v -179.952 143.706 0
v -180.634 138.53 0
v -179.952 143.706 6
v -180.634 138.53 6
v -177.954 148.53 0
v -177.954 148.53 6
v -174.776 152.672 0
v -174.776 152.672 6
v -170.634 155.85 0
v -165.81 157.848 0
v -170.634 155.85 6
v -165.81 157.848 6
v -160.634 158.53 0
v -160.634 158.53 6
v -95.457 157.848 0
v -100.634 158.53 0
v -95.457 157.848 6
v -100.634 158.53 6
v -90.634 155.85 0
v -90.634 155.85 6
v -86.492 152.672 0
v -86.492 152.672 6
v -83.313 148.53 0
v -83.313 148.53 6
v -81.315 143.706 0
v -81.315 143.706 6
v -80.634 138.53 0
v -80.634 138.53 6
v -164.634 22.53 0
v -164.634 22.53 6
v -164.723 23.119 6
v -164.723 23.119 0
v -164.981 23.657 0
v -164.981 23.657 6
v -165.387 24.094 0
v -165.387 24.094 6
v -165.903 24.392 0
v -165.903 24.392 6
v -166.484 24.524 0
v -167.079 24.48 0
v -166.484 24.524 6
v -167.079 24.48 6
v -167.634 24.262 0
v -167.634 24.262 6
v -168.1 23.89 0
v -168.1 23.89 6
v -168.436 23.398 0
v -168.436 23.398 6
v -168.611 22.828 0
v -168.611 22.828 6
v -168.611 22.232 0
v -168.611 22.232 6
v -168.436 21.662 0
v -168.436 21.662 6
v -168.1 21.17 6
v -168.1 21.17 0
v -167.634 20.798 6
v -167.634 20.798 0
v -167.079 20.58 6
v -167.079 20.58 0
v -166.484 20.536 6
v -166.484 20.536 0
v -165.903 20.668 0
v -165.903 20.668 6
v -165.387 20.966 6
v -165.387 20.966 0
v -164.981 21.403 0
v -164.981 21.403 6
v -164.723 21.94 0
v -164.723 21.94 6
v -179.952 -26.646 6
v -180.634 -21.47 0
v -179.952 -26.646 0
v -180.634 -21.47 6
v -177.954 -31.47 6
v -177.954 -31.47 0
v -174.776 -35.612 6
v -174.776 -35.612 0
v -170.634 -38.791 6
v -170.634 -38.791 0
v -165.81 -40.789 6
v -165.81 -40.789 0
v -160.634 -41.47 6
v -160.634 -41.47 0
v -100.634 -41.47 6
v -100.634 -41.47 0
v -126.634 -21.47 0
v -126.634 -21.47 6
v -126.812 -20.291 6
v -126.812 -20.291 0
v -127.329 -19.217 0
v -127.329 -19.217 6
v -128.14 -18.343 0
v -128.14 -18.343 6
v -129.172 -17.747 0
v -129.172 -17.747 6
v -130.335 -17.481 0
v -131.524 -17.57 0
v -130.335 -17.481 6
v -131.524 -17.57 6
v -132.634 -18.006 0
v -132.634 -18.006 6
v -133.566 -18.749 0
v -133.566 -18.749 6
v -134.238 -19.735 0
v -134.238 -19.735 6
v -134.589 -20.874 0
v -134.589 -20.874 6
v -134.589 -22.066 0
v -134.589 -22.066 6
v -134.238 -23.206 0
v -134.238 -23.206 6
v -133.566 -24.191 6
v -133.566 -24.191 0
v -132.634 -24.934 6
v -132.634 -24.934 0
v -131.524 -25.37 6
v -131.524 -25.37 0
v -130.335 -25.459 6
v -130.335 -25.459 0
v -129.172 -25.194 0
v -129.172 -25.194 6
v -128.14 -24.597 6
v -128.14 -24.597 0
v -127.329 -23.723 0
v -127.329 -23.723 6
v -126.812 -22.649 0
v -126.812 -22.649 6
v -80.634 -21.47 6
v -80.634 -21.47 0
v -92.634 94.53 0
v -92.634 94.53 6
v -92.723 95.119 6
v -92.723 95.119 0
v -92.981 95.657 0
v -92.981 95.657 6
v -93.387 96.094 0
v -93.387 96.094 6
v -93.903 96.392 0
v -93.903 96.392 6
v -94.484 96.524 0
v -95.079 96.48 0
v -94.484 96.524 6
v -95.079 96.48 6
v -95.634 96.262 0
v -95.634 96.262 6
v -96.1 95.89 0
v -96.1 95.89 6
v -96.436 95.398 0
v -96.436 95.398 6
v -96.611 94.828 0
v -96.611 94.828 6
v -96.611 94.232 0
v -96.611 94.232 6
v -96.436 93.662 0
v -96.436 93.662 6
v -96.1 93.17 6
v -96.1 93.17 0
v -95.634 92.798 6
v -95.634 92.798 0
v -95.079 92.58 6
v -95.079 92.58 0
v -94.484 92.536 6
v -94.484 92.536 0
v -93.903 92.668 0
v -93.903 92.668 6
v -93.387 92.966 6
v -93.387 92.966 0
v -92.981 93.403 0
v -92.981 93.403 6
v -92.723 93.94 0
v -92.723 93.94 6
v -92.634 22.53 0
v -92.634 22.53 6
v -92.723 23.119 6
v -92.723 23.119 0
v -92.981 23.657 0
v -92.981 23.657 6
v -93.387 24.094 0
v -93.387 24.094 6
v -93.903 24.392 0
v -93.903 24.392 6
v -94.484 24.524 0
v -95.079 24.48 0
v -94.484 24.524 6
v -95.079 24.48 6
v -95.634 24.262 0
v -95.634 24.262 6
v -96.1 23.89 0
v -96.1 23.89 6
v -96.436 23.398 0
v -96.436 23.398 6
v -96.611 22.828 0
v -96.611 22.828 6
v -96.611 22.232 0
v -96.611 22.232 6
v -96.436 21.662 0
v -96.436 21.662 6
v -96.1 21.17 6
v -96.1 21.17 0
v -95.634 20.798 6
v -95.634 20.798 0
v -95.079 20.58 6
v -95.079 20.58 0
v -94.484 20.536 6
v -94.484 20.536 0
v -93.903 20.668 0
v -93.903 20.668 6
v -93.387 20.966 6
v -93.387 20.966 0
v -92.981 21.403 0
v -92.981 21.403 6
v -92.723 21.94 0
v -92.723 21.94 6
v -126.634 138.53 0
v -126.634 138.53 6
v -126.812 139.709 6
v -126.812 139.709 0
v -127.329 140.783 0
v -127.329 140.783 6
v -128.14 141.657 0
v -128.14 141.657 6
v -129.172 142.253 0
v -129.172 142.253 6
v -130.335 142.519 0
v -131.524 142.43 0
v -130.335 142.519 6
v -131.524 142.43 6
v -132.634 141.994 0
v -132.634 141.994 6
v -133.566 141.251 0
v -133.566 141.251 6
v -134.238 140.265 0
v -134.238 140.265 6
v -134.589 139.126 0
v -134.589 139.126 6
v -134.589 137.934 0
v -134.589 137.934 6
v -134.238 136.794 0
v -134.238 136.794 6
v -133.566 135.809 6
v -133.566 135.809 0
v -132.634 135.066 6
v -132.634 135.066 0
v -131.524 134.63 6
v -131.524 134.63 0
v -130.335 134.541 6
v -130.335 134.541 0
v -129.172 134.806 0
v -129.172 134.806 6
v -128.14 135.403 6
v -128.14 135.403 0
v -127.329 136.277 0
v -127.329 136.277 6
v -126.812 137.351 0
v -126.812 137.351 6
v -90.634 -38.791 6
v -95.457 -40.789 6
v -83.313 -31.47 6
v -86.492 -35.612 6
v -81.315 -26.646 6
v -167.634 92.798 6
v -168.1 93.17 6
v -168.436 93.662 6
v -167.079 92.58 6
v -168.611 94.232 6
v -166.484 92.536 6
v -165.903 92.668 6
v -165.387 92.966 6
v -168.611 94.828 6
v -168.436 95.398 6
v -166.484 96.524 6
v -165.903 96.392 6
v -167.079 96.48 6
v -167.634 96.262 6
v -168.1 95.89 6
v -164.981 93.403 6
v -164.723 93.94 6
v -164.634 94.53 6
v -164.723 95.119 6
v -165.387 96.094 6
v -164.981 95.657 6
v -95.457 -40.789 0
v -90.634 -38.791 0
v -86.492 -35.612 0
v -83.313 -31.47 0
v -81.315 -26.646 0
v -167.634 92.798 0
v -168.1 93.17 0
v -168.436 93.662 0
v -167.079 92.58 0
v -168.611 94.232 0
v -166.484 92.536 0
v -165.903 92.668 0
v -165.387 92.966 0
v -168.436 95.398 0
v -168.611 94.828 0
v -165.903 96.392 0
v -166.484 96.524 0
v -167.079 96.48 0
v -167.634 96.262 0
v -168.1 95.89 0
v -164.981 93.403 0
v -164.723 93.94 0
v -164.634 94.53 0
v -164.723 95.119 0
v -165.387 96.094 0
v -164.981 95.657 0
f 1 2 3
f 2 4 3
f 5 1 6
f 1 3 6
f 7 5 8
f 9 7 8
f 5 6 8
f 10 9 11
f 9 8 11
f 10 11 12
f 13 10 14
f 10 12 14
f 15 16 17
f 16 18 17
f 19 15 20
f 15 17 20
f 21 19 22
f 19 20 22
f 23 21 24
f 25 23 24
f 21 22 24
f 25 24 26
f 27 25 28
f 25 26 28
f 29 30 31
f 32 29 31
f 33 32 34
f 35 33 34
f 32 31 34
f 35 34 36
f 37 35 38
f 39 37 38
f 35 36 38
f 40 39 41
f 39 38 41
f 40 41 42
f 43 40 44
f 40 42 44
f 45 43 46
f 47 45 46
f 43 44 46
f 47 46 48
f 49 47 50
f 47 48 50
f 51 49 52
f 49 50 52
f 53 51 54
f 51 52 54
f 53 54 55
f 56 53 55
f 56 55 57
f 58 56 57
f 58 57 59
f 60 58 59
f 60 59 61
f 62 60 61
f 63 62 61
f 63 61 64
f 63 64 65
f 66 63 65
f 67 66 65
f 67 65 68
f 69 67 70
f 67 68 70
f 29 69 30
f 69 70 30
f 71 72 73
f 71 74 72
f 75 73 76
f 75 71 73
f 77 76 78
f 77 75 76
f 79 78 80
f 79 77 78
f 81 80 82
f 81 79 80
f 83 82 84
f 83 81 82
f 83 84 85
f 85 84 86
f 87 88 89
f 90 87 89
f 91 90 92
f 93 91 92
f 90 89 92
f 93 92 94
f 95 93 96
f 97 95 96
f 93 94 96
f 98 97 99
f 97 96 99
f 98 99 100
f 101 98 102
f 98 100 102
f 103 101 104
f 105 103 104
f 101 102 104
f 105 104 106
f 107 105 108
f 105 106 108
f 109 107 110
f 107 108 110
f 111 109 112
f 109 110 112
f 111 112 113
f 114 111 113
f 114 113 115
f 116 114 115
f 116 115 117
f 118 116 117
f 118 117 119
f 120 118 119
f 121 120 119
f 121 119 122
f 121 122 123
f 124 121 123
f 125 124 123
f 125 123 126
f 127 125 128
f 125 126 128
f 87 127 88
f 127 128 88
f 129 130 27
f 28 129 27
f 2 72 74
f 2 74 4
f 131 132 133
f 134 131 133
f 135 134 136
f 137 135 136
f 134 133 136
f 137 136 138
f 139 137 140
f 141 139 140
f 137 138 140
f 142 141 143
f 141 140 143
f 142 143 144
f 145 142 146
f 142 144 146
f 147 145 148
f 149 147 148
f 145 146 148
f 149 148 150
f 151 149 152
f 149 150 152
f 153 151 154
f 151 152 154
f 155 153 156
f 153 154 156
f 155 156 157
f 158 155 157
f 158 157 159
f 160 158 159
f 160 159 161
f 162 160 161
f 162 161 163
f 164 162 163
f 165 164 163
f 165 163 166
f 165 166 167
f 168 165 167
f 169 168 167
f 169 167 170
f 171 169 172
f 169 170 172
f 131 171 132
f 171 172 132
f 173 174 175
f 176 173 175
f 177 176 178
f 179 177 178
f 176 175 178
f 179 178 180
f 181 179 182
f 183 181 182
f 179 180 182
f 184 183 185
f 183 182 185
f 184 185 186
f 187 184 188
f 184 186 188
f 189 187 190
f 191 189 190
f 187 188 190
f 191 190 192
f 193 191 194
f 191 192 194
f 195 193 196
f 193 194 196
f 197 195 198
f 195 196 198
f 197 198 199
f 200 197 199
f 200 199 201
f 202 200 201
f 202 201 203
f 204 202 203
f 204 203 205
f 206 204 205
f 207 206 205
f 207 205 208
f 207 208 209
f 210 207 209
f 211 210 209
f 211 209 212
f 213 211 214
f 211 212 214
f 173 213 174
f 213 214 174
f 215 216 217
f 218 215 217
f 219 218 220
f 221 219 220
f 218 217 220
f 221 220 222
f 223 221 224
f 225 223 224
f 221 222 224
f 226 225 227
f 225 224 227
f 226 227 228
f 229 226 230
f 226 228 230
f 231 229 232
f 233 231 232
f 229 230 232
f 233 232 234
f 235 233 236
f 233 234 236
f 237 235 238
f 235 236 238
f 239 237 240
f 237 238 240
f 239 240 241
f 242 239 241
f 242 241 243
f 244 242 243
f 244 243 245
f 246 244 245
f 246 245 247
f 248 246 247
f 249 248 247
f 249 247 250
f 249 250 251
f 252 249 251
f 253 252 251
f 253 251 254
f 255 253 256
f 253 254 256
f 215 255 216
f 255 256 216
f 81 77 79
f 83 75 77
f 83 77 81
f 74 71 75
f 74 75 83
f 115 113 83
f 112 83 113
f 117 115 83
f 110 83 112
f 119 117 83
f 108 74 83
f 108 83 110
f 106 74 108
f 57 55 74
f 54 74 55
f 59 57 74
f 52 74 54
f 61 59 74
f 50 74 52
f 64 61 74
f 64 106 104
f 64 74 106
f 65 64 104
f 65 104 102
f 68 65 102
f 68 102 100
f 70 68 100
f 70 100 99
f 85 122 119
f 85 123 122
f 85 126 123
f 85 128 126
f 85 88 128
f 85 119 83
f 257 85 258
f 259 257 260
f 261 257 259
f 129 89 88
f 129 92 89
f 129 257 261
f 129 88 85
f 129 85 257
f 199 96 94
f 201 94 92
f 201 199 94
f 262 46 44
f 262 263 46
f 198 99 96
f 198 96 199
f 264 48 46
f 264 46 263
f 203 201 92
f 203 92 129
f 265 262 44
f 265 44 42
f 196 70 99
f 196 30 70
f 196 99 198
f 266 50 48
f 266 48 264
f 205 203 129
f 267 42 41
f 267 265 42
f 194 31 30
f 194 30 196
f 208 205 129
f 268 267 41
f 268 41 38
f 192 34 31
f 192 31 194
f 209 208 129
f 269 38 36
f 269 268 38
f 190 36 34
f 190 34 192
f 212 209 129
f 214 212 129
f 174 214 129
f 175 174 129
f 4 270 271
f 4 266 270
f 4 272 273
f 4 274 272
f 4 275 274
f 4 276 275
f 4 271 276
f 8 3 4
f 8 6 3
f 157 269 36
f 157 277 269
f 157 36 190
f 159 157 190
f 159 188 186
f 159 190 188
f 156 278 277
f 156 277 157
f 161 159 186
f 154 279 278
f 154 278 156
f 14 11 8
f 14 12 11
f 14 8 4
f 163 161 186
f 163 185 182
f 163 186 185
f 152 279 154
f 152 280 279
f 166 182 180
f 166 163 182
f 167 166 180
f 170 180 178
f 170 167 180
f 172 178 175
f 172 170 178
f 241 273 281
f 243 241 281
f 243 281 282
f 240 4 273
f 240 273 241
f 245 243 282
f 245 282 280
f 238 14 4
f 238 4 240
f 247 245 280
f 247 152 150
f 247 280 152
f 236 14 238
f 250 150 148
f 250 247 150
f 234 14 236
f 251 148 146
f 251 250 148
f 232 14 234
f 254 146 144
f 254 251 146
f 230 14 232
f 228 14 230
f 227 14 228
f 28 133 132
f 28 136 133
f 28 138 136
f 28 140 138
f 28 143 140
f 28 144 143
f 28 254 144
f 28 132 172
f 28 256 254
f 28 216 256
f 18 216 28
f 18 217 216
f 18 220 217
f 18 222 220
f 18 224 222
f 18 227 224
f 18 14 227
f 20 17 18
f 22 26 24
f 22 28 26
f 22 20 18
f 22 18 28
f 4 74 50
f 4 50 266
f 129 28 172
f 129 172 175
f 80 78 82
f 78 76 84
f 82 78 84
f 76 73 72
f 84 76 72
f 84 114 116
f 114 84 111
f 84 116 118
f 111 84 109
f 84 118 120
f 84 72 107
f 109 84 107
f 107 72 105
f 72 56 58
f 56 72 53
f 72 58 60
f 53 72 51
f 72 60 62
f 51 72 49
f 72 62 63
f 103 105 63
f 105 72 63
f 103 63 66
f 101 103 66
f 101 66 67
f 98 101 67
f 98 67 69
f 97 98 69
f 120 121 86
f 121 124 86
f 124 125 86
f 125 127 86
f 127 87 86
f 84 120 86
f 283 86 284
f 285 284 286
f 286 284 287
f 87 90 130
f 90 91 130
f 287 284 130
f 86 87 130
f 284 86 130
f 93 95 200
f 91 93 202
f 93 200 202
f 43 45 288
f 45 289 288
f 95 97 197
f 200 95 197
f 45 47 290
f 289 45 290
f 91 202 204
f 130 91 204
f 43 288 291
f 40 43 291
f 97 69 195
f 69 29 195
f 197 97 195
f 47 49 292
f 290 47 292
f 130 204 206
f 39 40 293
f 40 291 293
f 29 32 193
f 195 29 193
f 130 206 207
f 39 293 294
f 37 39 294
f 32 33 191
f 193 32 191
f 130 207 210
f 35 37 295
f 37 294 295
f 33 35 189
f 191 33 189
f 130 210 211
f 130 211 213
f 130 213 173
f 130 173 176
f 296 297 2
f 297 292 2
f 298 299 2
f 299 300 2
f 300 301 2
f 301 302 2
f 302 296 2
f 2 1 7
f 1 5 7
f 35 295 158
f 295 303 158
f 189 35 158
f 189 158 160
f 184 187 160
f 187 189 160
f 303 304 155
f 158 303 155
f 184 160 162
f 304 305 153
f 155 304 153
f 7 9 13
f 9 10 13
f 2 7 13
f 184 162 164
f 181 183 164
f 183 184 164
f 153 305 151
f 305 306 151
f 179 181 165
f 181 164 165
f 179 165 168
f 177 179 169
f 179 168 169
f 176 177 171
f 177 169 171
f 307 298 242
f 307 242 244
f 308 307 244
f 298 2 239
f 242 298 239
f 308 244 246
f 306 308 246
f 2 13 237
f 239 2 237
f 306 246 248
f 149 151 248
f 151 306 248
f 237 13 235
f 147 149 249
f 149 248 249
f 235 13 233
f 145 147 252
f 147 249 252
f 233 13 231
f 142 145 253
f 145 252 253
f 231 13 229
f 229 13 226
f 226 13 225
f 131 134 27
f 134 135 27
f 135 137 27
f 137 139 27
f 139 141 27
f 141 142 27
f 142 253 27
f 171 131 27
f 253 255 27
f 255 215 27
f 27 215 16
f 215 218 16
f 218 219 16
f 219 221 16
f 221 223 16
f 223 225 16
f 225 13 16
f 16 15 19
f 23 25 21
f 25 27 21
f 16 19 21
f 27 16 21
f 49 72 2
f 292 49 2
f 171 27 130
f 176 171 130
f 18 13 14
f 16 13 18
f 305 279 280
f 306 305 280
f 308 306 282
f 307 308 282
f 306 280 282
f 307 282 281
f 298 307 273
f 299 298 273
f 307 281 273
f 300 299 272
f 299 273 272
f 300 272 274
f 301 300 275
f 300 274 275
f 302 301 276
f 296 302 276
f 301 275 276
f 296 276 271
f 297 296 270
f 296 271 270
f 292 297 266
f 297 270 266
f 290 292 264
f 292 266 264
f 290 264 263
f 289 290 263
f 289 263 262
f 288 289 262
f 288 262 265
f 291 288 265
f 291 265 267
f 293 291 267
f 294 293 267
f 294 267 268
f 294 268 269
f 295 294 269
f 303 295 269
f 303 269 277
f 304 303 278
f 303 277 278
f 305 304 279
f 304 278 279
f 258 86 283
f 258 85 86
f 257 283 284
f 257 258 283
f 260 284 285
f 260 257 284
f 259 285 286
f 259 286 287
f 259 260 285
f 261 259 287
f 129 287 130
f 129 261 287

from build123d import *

# Parameters (mm, degrees)
ESQUISSE1_W             = 100
ESQUISSE1_H             = 200
BOSS_EXTRU_1_DEPTH      = 6
ESQUISSE2_R             = 2
ESQUISSE2_R_2           = 4
ENL_V_MAT_EXTRU_1_DEPTH = 6
CONG_1_R                = 20


with BuildPart() as part:
    # Esquisse1 → Boss.-Extru.1 (new body)
    with BuildSketch(Plane.XY):
        with Locations((-130.633802817, 58.529929577)):
            Rectangle(ESQUISSE1_W, ESQUISSE1_H)
    extrude(amount=BOSS_EXTRU_1_DEPTH)

    # Esquisse2 → Enlèv. mat.-Extru.1 (cut)
    with BuildSketch(Plane.XY.offset(6)):
        with Locations((-166.633802817, 94.529929577)):
            Circle(ESQUISSE2_R)
        with Locations((-166.633802817, 22.529929577)):
            Circle(ESQUISSE2_R)
        with Locations((-94.633802817, 22.529929577)):
            Circle(ESQUISSE2_R)
        with Locations((-94.633802817, 94.529929577)):
            Circle(ESQUISSE2_R)
        with Locations((-130.633802817, 138.529929577)):
            Circle(ESQUISSE2_R_2)
        with Locations((-130.633802817, -21.470070423)):
            Circle(ESQUISSE2_R_2)
    extrude(amount=-ENL_V_MAT_EXTRU_1_DEPTH, mode=Mode.SUBTRACT)

    # Congé1
    cong_1_edges = [part.edges().sort_by_distance(p)[0] for p in [
        (-180.633802817, 158.529929577, 3),
        (-80.633802817, 158.529929577, 3),
        (-80.633802817, -41.470070423, 3),
        (-180.633802817, -41.470070423, 3),
    ]]
    fillet(cong_1_edges, radius=CONG_1_R)


solid = part.part
